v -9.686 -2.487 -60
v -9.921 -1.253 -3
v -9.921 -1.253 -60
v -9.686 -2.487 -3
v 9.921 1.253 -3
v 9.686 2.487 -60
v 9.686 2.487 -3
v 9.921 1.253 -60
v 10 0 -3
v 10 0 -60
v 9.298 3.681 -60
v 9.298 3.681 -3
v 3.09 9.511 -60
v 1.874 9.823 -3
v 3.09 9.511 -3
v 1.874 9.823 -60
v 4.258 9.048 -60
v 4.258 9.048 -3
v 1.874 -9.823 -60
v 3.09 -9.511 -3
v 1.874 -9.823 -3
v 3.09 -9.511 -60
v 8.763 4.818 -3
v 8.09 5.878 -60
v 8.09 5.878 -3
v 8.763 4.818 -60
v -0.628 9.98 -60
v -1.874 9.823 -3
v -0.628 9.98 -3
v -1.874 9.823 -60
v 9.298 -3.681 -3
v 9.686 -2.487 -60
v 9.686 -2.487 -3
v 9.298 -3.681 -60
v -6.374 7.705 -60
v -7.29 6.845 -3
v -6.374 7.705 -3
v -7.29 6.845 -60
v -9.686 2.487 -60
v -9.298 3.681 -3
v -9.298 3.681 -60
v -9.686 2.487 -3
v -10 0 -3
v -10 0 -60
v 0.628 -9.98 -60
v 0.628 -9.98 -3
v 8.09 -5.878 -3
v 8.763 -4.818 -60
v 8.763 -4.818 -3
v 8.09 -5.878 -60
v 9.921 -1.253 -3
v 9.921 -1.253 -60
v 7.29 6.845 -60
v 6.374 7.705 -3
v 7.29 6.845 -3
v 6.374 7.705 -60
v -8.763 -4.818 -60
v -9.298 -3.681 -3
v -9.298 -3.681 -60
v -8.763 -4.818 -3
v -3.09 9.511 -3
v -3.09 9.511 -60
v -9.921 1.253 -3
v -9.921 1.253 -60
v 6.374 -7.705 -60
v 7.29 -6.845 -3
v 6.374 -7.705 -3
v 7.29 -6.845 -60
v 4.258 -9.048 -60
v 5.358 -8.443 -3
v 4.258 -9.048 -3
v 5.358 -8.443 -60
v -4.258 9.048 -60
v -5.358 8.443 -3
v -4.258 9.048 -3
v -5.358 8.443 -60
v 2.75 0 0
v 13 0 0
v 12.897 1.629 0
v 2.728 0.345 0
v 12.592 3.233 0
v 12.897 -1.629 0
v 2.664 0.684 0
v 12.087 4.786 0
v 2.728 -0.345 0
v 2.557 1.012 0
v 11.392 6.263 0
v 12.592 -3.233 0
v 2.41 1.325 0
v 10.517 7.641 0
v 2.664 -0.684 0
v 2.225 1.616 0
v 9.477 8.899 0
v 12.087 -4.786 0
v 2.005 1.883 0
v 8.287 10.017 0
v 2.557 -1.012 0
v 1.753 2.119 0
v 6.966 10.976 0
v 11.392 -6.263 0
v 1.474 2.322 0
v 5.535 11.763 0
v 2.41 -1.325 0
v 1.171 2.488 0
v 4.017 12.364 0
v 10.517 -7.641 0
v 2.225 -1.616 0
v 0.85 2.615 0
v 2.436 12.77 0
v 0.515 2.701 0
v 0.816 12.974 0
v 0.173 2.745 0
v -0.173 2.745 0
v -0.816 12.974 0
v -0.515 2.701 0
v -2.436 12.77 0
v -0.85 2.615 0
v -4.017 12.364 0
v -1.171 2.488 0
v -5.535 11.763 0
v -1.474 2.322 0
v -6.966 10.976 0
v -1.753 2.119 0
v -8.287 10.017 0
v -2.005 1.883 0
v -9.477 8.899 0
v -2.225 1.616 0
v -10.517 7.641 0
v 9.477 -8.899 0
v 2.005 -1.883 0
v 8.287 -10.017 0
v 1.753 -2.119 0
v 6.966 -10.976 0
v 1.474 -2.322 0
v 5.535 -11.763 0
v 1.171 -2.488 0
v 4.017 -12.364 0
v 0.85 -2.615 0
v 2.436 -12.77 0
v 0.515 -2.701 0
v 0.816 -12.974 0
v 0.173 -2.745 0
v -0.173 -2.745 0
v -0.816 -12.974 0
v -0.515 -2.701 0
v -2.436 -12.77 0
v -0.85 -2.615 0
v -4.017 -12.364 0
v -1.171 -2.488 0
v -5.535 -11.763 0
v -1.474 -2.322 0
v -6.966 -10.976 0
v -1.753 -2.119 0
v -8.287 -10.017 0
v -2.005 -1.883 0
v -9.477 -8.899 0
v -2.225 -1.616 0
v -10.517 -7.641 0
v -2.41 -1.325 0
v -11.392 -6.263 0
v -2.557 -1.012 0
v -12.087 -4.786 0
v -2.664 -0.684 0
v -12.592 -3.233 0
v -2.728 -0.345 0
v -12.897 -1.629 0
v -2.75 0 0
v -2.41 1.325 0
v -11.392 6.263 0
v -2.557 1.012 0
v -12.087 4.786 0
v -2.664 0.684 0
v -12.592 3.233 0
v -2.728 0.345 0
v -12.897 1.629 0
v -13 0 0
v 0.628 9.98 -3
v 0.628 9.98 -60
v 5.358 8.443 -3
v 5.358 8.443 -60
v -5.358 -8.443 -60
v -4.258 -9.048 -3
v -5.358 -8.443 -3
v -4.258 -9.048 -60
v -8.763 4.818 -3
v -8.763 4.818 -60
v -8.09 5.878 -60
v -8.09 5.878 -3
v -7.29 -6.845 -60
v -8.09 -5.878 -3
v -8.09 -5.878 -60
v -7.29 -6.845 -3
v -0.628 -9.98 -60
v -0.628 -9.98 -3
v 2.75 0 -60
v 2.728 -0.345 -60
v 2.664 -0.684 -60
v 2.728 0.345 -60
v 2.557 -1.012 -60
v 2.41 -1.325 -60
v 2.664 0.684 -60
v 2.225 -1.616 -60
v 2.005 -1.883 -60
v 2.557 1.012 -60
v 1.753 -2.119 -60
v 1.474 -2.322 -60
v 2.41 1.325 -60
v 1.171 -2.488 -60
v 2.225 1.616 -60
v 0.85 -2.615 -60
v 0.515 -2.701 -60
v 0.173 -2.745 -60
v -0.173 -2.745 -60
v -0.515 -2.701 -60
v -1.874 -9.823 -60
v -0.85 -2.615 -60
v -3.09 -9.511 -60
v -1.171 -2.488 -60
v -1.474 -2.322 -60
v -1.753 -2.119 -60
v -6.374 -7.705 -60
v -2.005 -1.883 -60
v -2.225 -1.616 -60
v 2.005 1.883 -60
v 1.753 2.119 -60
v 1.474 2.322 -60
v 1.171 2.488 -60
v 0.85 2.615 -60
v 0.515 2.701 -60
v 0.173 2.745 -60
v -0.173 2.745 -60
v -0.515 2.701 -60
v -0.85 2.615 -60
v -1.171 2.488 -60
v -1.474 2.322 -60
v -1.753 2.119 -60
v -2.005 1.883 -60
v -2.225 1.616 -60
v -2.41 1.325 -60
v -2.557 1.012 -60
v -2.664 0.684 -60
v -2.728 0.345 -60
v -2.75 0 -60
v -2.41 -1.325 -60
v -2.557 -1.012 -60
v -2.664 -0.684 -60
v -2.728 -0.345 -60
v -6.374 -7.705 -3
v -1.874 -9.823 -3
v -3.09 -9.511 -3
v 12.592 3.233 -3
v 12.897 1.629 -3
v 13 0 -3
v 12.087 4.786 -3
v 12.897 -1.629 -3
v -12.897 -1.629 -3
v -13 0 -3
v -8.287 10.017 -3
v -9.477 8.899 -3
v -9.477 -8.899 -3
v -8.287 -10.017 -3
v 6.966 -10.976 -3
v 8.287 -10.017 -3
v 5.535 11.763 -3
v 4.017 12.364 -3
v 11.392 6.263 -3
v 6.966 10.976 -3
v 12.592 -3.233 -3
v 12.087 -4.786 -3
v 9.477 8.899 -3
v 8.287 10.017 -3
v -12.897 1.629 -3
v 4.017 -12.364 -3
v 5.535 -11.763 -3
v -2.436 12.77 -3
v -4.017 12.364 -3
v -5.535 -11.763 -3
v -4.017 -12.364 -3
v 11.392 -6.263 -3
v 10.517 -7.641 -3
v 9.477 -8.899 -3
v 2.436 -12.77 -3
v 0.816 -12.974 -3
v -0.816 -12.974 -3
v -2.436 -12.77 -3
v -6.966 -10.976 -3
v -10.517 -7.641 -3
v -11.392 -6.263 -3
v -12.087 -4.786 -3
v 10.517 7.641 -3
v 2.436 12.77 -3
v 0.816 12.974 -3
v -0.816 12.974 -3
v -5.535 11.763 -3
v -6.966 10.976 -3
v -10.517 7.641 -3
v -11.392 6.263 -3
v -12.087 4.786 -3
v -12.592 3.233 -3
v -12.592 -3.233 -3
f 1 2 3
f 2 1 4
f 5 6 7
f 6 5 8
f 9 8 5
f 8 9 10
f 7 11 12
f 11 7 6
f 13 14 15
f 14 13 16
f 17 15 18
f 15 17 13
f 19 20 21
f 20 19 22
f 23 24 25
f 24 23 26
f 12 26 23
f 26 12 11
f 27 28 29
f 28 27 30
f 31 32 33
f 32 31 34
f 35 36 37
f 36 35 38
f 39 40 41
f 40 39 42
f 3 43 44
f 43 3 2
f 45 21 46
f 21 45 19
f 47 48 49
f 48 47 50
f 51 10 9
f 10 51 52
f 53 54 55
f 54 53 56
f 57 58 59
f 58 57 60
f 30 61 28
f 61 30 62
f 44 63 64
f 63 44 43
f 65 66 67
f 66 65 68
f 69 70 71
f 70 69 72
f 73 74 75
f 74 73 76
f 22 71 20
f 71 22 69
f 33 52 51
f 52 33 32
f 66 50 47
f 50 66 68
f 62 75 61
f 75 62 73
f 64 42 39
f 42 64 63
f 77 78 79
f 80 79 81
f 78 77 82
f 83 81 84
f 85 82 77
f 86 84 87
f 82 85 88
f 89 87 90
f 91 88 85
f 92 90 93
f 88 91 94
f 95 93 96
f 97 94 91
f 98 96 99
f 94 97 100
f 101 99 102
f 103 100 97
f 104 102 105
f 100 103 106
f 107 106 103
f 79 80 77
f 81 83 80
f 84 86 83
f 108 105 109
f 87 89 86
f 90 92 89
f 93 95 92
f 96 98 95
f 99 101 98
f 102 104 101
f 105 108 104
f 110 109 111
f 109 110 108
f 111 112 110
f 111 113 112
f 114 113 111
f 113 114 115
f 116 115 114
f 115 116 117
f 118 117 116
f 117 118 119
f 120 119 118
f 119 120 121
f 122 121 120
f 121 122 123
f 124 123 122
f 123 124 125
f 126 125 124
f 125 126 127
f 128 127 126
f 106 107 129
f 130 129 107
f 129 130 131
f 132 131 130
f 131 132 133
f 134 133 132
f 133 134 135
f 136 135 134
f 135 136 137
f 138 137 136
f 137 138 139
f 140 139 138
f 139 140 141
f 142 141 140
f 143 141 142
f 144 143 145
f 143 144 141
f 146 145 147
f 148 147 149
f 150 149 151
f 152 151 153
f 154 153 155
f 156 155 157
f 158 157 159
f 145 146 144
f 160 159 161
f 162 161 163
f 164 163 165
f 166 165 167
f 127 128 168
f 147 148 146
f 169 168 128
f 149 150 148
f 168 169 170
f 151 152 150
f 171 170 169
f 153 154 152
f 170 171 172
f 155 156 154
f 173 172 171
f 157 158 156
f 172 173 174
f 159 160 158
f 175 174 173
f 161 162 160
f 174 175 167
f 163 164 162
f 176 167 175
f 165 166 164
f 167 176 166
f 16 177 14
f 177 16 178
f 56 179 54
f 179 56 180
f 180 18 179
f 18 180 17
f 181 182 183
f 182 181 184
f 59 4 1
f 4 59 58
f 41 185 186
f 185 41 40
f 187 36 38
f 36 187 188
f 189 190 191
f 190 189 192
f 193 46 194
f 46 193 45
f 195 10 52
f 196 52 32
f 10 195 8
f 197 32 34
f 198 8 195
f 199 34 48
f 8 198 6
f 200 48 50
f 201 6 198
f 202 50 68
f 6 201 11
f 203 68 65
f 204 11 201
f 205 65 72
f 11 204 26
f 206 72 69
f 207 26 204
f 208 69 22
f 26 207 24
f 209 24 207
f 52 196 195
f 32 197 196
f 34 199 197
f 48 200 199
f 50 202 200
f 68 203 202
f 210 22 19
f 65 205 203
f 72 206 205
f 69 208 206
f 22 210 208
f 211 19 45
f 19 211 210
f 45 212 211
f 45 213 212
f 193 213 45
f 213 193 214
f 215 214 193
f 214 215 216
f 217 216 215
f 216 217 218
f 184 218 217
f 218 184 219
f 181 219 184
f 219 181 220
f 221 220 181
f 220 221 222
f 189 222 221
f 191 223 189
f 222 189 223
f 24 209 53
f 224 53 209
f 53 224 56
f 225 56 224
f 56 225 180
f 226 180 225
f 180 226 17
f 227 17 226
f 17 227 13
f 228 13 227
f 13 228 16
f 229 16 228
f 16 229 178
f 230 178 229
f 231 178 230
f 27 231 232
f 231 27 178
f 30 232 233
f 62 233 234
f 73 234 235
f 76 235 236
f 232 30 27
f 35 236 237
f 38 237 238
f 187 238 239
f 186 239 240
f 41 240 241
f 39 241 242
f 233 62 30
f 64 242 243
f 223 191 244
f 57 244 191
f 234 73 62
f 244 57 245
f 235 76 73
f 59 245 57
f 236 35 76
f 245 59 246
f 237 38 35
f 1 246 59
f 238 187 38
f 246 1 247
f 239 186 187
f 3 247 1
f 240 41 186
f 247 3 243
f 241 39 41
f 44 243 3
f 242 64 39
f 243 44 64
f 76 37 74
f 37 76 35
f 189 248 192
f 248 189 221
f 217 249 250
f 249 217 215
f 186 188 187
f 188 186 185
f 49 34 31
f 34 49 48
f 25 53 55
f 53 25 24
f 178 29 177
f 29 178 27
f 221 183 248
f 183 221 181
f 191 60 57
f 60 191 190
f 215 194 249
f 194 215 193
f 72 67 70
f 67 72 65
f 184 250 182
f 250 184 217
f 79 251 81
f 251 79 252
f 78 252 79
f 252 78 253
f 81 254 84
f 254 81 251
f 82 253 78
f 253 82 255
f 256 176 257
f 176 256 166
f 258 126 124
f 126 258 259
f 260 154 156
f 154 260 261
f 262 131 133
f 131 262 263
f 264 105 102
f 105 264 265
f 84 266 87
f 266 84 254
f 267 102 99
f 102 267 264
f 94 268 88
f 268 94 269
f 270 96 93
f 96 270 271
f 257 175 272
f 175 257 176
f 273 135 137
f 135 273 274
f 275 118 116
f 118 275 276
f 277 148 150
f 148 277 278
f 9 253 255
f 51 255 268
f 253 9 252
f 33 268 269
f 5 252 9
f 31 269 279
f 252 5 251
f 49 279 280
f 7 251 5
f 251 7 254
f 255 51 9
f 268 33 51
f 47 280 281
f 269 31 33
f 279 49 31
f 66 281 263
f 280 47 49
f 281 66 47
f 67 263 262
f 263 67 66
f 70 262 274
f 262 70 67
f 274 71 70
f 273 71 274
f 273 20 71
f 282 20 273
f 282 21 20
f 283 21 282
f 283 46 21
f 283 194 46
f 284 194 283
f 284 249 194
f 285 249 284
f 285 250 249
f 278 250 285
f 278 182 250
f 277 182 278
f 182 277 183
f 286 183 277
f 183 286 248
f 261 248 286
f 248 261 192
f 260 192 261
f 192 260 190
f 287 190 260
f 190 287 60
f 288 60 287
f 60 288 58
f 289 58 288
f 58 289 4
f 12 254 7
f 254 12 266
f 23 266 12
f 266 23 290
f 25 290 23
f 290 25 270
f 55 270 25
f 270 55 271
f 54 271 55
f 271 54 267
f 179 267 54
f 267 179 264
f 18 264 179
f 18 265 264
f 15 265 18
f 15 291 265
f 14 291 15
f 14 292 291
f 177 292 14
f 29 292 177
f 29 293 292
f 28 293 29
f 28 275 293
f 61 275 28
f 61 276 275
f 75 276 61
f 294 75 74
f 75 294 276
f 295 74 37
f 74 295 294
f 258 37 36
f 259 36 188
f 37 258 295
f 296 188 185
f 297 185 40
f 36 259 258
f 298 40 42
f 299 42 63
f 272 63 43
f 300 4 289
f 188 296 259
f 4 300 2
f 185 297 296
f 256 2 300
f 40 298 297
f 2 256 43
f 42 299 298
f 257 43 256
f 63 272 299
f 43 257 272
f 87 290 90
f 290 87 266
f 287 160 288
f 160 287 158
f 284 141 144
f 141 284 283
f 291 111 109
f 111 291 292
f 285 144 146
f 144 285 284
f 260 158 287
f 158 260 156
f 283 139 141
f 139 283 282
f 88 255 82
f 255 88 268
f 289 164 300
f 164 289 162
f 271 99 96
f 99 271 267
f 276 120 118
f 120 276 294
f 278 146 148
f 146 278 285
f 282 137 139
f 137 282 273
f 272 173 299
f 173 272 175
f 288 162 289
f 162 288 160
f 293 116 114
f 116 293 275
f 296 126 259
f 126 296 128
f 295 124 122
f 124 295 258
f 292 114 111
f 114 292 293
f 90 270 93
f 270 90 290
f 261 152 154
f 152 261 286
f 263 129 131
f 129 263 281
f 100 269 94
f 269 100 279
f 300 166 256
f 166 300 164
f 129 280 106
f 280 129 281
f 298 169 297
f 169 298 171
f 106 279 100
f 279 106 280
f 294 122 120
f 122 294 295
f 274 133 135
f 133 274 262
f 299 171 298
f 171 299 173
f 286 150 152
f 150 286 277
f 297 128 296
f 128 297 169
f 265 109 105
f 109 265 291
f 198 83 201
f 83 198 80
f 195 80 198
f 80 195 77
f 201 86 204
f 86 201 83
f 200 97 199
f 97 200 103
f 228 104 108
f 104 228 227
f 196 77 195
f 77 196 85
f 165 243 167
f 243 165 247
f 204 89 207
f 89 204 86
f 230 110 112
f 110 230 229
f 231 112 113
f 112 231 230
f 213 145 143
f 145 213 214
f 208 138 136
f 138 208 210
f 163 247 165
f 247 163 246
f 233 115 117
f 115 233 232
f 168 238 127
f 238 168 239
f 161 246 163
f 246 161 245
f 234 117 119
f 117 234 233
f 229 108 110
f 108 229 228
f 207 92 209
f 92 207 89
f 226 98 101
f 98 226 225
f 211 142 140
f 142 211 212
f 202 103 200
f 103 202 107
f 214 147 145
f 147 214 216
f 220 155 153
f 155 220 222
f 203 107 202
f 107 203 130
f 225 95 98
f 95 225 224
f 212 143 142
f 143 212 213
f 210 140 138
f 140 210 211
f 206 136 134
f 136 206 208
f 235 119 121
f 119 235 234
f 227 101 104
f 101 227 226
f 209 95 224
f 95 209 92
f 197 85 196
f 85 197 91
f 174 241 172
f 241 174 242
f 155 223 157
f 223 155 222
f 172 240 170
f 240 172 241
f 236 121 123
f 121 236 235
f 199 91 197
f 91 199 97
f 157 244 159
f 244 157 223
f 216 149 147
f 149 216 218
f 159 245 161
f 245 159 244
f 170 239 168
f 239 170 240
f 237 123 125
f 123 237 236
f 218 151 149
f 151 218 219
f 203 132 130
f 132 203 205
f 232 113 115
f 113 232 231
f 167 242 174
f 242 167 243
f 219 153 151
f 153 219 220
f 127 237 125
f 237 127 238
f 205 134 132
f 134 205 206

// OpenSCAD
$fn = 50;


difference() {
	union() {
		translate(v = [0, 0, -60.0000000000]) {
			cylinder(h = 60, r = 10.0000000000);
		}
		translate(v = [0, 0, -3.0000000000]) {
			cylinder(h = 3, r = 13.0000000000);
		}
	}
	union() {
		#translate(v = [0, 0, -60]) {
			cylinder(h = 60, r = 2.7500000000);
		}
	}
}
